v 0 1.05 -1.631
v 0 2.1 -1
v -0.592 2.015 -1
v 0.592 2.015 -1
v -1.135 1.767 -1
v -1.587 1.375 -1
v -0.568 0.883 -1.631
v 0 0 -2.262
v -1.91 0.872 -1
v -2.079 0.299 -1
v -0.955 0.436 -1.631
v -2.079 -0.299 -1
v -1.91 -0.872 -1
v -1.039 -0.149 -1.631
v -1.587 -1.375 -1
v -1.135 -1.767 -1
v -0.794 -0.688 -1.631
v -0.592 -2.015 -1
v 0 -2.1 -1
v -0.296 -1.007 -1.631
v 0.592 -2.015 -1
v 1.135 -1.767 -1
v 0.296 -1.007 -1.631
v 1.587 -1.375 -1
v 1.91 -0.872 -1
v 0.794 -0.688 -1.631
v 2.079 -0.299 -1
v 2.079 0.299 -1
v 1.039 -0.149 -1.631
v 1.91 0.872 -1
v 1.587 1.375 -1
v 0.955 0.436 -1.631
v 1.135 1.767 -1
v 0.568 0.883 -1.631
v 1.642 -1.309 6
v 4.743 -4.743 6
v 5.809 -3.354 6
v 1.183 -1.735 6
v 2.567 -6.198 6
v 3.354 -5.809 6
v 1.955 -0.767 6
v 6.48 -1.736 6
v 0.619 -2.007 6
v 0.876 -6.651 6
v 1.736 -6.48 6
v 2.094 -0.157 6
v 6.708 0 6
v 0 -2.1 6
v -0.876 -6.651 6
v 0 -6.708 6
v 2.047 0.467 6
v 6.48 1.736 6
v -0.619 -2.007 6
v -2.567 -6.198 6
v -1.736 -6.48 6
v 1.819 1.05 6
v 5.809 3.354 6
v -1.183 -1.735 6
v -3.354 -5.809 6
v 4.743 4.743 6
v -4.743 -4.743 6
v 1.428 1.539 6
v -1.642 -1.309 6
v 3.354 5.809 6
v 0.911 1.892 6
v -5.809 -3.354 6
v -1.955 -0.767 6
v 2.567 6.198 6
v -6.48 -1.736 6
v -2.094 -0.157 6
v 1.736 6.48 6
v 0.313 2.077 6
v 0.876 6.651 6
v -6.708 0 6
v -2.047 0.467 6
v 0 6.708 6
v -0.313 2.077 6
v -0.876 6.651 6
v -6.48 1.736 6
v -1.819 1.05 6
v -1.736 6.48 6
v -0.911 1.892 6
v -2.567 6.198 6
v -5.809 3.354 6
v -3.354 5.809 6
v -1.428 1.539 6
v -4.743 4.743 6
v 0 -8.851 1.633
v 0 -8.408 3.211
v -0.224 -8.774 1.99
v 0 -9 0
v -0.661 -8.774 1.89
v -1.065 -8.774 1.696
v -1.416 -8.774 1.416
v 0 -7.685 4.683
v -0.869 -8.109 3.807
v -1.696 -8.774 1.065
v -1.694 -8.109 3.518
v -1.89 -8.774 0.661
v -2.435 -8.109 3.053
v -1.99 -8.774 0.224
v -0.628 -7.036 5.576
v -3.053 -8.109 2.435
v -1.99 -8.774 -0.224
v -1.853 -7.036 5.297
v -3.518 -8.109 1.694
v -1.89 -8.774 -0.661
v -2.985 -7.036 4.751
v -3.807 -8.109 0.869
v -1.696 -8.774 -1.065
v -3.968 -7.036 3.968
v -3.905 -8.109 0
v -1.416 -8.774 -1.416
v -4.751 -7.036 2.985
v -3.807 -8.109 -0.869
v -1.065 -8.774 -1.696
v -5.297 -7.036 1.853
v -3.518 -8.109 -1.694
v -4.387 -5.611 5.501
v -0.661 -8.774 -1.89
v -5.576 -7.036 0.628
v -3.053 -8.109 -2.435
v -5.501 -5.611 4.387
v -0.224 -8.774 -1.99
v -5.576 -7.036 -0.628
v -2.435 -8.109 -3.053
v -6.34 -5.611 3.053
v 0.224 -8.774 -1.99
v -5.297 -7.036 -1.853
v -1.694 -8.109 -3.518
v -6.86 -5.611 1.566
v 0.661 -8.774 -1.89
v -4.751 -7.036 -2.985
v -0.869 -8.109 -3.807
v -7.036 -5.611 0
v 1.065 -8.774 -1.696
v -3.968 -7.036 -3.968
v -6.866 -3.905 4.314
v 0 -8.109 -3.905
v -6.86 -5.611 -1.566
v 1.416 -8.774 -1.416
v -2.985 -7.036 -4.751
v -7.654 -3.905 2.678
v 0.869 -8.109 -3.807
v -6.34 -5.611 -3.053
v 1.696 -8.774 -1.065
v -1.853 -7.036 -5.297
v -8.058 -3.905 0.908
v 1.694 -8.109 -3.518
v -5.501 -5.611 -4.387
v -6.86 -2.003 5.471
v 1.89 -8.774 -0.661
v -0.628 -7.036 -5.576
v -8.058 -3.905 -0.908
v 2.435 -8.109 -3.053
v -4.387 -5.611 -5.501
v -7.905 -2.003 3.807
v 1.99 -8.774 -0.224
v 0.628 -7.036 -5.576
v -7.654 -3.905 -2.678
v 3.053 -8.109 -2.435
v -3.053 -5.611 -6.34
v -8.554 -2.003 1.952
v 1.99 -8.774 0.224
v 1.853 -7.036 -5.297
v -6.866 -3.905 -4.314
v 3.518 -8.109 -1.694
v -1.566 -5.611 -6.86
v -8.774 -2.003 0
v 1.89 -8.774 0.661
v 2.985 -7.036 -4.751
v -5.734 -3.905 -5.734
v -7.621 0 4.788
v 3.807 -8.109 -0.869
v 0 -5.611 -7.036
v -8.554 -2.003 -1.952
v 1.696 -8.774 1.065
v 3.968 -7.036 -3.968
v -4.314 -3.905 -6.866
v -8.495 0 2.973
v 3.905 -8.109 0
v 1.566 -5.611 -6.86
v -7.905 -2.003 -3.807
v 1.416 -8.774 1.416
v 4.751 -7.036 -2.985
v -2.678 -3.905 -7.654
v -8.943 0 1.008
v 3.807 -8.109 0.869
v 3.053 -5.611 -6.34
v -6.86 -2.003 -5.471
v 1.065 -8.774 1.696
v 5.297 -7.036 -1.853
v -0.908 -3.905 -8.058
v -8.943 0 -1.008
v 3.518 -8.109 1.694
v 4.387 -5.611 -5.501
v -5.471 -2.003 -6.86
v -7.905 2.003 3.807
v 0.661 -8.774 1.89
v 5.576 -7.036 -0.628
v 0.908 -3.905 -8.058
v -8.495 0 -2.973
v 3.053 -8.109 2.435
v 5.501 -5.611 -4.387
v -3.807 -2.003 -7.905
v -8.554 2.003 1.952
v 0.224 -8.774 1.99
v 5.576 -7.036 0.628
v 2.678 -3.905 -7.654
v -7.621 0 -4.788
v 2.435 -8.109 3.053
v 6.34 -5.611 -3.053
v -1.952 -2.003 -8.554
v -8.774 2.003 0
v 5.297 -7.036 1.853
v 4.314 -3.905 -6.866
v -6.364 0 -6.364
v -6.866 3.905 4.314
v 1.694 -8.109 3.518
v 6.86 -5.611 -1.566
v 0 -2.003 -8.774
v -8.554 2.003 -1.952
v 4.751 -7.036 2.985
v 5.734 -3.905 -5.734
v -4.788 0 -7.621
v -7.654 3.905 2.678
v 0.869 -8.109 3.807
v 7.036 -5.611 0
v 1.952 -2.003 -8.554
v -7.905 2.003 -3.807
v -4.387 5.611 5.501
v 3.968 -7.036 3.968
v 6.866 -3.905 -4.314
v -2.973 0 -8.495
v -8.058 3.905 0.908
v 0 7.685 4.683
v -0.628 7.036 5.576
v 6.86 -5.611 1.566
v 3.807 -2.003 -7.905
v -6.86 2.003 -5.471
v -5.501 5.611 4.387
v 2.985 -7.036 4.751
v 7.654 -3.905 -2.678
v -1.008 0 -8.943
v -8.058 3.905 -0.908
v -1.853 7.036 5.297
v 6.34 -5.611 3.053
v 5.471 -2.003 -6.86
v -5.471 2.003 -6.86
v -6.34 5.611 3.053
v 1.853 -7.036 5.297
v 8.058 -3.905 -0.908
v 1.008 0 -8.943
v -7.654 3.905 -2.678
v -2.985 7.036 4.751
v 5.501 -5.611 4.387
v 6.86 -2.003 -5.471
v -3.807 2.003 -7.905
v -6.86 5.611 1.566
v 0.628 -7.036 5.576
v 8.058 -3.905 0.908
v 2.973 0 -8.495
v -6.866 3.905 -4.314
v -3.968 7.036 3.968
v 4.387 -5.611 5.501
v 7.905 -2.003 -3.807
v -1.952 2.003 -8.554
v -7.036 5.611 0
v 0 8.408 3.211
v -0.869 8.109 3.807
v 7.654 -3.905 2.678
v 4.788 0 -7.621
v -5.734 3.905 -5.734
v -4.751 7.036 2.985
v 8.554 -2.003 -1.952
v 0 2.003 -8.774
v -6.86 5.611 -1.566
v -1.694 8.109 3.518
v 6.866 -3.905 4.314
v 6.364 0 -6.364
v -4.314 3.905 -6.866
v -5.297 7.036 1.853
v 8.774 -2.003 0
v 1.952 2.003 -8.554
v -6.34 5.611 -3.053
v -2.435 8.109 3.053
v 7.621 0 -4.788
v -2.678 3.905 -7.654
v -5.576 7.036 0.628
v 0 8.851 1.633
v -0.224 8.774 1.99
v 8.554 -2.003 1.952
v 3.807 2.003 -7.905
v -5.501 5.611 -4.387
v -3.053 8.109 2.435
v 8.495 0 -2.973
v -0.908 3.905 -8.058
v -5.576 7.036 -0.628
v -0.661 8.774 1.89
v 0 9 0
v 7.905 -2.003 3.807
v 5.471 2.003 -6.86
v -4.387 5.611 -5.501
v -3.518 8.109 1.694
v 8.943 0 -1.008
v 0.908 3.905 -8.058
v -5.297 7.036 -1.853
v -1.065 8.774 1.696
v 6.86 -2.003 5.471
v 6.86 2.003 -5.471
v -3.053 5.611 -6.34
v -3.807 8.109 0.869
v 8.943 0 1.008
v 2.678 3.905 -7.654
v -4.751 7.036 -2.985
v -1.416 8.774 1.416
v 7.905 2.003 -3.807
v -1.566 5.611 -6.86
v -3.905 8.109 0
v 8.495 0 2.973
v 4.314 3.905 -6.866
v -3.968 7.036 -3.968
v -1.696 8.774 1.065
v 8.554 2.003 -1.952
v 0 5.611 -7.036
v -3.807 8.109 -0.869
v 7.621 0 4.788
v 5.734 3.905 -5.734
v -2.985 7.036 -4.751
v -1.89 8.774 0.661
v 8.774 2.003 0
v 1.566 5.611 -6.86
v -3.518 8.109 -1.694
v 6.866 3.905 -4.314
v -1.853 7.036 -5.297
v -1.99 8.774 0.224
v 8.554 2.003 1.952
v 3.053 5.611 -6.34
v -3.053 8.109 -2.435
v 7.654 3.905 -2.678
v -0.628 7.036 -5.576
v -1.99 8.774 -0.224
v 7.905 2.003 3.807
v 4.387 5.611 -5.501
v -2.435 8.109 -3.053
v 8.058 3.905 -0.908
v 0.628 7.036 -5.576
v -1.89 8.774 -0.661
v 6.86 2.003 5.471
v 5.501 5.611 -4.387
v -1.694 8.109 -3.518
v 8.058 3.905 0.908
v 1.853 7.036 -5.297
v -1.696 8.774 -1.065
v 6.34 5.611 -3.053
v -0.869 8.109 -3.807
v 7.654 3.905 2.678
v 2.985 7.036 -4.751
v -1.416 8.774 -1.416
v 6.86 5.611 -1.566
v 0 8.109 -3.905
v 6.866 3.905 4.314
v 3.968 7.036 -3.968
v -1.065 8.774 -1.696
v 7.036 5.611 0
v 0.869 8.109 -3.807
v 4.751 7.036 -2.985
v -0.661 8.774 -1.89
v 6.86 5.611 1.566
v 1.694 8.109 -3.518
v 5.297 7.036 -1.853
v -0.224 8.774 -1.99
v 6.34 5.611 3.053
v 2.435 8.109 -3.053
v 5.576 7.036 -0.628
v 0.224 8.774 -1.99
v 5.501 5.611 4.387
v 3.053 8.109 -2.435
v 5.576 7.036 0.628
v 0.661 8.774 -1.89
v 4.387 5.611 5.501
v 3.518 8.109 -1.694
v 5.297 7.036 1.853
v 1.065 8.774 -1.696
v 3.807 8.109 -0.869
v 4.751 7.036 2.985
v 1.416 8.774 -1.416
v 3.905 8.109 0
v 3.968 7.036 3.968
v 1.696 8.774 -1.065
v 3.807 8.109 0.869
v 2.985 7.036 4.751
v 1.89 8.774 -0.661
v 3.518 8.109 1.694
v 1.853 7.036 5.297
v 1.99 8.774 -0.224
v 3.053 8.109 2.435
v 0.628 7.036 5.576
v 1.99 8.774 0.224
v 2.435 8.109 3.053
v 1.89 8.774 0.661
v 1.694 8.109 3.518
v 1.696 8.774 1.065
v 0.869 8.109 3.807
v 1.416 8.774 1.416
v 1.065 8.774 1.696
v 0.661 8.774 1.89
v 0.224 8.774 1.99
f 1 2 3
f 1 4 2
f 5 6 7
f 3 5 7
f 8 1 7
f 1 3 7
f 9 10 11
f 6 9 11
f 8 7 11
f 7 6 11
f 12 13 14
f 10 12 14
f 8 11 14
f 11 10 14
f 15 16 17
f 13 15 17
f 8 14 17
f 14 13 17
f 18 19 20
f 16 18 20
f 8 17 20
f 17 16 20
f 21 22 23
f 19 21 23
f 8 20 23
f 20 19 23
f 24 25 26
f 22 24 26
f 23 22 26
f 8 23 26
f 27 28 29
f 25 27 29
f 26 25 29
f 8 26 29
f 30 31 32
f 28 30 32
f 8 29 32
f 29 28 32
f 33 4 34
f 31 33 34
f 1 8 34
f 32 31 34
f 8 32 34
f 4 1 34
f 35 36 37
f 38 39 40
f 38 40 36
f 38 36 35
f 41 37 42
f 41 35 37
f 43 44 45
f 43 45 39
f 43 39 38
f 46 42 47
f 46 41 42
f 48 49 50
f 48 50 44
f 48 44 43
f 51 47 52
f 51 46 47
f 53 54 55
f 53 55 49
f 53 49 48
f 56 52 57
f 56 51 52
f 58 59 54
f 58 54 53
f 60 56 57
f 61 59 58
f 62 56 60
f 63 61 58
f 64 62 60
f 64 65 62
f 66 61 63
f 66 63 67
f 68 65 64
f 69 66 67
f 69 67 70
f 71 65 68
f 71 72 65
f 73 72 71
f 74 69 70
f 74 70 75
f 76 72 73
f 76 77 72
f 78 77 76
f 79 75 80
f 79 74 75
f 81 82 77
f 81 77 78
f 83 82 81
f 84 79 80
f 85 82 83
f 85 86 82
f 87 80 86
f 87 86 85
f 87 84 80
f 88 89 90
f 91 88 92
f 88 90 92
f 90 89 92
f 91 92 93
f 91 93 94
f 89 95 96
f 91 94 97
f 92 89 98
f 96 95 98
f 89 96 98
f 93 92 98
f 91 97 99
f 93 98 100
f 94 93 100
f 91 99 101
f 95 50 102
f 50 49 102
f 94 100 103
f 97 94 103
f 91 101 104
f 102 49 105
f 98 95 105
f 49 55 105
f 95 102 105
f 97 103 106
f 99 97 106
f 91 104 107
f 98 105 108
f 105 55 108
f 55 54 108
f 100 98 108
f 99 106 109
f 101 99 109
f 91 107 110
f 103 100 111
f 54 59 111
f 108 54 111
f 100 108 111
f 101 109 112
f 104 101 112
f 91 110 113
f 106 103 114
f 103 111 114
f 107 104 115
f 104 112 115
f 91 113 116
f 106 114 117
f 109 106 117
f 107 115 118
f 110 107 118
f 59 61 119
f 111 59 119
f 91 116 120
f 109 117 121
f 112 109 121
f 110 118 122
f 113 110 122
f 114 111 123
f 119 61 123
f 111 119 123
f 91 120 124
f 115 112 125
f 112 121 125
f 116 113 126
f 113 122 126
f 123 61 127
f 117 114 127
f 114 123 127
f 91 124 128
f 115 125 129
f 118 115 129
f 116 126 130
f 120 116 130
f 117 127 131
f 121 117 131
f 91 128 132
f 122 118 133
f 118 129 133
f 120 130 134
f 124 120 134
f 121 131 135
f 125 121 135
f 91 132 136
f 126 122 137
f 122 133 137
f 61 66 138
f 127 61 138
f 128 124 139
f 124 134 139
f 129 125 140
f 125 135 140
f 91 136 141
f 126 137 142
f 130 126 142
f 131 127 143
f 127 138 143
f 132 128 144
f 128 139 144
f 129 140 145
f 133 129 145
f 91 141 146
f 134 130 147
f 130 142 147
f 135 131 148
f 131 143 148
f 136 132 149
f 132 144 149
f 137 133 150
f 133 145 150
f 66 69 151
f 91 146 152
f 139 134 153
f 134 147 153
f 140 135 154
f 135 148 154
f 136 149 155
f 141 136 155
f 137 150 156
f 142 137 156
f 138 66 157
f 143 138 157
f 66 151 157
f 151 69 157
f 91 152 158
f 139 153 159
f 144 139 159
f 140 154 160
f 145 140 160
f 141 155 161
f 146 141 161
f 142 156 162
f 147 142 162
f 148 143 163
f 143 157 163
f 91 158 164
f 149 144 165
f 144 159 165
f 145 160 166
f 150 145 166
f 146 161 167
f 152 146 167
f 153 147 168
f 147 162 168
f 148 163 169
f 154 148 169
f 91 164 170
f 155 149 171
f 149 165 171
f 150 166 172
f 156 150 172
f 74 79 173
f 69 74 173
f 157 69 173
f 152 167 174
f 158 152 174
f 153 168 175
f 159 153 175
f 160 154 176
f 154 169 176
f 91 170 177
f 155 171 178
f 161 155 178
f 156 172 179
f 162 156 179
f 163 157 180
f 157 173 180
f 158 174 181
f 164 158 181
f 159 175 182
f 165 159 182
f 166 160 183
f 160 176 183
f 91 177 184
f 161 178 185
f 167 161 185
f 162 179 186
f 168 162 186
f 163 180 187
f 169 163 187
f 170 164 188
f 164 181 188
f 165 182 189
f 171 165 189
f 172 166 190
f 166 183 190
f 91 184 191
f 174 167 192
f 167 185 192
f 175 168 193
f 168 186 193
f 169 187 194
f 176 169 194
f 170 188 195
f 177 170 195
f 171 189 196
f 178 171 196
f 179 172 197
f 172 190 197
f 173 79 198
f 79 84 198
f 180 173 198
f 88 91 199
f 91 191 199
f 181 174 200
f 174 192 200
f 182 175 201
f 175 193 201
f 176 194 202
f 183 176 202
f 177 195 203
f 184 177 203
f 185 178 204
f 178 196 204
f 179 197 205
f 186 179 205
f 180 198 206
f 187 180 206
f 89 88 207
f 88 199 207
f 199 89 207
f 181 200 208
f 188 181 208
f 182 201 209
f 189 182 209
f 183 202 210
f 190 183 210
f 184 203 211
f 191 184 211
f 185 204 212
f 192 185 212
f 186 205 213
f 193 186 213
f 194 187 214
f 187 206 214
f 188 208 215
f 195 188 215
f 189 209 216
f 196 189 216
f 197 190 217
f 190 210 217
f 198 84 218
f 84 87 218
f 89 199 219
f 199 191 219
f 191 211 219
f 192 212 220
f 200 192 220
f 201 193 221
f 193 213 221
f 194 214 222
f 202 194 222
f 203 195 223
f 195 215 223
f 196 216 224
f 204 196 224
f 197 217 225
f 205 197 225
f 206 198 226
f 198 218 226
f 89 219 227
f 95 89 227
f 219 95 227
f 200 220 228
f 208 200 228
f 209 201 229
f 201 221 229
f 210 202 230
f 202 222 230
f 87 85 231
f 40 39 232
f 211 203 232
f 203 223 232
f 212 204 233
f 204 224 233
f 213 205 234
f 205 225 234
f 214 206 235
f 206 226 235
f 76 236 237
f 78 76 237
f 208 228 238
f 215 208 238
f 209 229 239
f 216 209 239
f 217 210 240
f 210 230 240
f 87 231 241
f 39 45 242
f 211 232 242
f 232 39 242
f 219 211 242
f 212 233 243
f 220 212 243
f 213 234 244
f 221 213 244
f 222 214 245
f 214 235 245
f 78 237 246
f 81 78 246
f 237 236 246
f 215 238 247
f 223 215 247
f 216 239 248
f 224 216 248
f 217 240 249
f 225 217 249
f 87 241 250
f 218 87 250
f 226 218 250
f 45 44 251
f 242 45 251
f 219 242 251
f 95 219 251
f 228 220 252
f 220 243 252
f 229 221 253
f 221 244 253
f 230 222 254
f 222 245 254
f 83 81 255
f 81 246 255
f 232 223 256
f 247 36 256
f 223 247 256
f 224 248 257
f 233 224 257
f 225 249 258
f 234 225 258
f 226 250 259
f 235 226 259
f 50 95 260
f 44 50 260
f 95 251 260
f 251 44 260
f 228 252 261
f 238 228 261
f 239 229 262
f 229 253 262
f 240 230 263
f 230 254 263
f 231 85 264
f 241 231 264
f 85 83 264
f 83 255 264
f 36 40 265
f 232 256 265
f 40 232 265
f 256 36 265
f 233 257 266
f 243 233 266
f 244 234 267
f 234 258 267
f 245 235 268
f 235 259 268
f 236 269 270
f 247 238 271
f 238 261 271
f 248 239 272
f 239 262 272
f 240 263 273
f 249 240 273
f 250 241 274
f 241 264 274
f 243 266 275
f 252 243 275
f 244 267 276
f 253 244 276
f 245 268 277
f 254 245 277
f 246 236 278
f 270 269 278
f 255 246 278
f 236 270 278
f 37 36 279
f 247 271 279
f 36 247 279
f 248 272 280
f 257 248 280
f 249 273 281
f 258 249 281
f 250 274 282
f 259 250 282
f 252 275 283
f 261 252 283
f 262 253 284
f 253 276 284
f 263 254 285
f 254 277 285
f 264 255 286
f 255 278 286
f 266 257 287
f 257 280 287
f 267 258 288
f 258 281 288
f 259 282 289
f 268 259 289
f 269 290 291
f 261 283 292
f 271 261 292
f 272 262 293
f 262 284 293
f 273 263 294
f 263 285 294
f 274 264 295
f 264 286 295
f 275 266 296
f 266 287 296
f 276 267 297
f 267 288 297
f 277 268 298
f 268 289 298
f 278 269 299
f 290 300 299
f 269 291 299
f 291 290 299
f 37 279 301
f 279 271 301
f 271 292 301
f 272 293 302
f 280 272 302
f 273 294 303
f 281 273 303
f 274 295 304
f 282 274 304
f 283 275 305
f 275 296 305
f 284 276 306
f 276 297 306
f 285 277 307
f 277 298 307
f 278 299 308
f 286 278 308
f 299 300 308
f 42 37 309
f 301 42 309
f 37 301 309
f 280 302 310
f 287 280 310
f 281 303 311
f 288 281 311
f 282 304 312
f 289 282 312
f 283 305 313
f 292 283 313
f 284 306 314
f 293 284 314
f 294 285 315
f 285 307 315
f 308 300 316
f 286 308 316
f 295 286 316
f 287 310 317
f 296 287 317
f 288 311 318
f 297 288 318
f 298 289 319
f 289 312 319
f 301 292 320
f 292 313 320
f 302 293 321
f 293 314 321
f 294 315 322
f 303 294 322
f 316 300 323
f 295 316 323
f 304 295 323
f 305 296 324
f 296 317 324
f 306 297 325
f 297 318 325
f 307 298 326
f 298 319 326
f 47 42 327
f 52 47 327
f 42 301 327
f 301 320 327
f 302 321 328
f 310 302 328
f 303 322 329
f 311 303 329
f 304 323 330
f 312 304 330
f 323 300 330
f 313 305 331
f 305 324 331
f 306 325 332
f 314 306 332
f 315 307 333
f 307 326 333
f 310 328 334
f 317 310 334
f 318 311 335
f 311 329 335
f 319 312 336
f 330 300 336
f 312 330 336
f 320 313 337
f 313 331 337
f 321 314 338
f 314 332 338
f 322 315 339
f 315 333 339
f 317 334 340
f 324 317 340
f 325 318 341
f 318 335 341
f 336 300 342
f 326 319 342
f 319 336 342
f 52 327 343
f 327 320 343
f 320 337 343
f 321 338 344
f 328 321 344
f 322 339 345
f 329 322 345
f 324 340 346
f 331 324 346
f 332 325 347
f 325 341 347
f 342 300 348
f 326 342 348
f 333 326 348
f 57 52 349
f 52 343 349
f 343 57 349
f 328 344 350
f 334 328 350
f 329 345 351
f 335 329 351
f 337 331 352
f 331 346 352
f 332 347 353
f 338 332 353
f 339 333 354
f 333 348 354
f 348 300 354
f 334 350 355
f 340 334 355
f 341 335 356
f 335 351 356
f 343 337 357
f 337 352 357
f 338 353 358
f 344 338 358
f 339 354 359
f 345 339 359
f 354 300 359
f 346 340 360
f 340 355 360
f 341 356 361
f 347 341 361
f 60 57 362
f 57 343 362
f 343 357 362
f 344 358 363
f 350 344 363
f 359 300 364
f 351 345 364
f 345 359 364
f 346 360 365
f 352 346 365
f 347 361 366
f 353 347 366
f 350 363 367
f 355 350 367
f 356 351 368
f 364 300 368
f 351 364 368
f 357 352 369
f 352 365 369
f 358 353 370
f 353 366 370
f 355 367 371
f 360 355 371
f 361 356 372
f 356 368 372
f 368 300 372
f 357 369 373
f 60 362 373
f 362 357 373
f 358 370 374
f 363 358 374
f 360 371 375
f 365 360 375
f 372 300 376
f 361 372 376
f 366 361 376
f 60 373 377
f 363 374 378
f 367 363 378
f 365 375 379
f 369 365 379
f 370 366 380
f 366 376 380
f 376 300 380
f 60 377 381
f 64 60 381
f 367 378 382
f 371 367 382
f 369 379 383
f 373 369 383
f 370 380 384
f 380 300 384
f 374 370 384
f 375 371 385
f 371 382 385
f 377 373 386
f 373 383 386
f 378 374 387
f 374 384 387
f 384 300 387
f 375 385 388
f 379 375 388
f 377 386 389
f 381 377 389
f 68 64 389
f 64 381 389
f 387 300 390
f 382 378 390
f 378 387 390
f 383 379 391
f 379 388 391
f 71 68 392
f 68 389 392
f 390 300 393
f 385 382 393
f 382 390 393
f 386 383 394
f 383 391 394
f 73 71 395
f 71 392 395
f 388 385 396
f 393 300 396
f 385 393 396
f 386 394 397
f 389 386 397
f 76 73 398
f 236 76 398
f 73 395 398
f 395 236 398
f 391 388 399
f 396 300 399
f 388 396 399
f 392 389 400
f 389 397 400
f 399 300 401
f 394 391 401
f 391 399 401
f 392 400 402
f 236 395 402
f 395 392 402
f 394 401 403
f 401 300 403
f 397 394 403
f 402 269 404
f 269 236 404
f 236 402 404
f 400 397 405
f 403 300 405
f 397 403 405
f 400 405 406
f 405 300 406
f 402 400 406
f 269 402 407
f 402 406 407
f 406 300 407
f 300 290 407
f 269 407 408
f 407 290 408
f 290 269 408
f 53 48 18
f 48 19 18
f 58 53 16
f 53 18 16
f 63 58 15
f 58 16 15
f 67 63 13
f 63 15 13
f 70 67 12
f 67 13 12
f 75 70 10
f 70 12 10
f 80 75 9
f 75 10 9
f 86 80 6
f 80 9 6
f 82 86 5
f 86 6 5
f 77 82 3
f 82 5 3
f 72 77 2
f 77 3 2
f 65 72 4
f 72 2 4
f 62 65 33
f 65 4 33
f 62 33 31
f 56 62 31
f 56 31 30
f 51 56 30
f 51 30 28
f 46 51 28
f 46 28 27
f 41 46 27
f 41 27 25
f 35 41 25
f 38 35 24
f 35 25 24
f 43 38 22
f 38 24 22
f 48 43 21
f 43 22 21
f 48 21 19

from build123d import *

# Parameters (mm, degrees)
CUT_EXTRUDE_1_DEPTH      = 16.588457268
CUT_EXTRUDE_1_DEPTH_BACK = 16.588457268
SKETCH_2_W               = 8.784286405
SKETCH_2_H               = 20.773221584
HOLE_WIZARD_M5_1_D       = 4.2
HOLE_WIZARD_M5_1_DEPTH   = 7
HOLE_WIZARD_M5_1_TIP     = 1.2618073


with BuildPart() as part:
    # 草图1 → 旋转1 (revolve)
    with BuildSketch(Plane(origin=(0, 0, 0), x_dir=(0, 0, -1), z_dir=(1, 0, 0))):
        with BuildLine():
            Line((0, 9), (0, -9))
            ThreePointArc((0, -9), (-9, 0), (0, 9))
        make_face()
    revolve(axis=Axis((0, 9, 0), (0, -1, 0)))

    # 草图2 → 切除-拉伸1 (cut, two sides: drawn at the far end of the back side and taken through both)
    with BuildSketch(Plane(origin=(0, 0, 0), x_dir=(0, 0, -1), z_dir=(1, 0, 0)).offset(-CUT_EXTRUDE_1_DEPTH_BACK)):
        with Locations((-10.392143203, 0)):
            Rectangle(SKETCH_2_W, SKETCH_2_H)
    extrude(amount=CUT_EXTRUDE_1_DEPTH + CUT_EXTRUDE_1_DEPTH_BACK, mode=Mode.SUBTRACT)

    # M5 螺纹孔1
    with Locations(Plane(origin=(0, 0, 6), x_dir=(0, 1, 0), z_dir=(0, 0, 1))):
        with Locations((0, 0)):
            Hole(HOLE_WIZARD_M5_1_D / 2, depth=HOLE_WIZARD_M5_1_DEPTH)
            with Locations((0, 0, -(HOLE_WIZARD_M5_1_DEPTH + HOLE_WIZARD_M5_1_TIP / 2))):  # 118° drill point
                Cone(0, HOLE_WIZARD_M5_1_D / 2, HOLE_WIZARD_M5_1_TIP, mode=Mode.SUBTRACT)


solid = part.part
